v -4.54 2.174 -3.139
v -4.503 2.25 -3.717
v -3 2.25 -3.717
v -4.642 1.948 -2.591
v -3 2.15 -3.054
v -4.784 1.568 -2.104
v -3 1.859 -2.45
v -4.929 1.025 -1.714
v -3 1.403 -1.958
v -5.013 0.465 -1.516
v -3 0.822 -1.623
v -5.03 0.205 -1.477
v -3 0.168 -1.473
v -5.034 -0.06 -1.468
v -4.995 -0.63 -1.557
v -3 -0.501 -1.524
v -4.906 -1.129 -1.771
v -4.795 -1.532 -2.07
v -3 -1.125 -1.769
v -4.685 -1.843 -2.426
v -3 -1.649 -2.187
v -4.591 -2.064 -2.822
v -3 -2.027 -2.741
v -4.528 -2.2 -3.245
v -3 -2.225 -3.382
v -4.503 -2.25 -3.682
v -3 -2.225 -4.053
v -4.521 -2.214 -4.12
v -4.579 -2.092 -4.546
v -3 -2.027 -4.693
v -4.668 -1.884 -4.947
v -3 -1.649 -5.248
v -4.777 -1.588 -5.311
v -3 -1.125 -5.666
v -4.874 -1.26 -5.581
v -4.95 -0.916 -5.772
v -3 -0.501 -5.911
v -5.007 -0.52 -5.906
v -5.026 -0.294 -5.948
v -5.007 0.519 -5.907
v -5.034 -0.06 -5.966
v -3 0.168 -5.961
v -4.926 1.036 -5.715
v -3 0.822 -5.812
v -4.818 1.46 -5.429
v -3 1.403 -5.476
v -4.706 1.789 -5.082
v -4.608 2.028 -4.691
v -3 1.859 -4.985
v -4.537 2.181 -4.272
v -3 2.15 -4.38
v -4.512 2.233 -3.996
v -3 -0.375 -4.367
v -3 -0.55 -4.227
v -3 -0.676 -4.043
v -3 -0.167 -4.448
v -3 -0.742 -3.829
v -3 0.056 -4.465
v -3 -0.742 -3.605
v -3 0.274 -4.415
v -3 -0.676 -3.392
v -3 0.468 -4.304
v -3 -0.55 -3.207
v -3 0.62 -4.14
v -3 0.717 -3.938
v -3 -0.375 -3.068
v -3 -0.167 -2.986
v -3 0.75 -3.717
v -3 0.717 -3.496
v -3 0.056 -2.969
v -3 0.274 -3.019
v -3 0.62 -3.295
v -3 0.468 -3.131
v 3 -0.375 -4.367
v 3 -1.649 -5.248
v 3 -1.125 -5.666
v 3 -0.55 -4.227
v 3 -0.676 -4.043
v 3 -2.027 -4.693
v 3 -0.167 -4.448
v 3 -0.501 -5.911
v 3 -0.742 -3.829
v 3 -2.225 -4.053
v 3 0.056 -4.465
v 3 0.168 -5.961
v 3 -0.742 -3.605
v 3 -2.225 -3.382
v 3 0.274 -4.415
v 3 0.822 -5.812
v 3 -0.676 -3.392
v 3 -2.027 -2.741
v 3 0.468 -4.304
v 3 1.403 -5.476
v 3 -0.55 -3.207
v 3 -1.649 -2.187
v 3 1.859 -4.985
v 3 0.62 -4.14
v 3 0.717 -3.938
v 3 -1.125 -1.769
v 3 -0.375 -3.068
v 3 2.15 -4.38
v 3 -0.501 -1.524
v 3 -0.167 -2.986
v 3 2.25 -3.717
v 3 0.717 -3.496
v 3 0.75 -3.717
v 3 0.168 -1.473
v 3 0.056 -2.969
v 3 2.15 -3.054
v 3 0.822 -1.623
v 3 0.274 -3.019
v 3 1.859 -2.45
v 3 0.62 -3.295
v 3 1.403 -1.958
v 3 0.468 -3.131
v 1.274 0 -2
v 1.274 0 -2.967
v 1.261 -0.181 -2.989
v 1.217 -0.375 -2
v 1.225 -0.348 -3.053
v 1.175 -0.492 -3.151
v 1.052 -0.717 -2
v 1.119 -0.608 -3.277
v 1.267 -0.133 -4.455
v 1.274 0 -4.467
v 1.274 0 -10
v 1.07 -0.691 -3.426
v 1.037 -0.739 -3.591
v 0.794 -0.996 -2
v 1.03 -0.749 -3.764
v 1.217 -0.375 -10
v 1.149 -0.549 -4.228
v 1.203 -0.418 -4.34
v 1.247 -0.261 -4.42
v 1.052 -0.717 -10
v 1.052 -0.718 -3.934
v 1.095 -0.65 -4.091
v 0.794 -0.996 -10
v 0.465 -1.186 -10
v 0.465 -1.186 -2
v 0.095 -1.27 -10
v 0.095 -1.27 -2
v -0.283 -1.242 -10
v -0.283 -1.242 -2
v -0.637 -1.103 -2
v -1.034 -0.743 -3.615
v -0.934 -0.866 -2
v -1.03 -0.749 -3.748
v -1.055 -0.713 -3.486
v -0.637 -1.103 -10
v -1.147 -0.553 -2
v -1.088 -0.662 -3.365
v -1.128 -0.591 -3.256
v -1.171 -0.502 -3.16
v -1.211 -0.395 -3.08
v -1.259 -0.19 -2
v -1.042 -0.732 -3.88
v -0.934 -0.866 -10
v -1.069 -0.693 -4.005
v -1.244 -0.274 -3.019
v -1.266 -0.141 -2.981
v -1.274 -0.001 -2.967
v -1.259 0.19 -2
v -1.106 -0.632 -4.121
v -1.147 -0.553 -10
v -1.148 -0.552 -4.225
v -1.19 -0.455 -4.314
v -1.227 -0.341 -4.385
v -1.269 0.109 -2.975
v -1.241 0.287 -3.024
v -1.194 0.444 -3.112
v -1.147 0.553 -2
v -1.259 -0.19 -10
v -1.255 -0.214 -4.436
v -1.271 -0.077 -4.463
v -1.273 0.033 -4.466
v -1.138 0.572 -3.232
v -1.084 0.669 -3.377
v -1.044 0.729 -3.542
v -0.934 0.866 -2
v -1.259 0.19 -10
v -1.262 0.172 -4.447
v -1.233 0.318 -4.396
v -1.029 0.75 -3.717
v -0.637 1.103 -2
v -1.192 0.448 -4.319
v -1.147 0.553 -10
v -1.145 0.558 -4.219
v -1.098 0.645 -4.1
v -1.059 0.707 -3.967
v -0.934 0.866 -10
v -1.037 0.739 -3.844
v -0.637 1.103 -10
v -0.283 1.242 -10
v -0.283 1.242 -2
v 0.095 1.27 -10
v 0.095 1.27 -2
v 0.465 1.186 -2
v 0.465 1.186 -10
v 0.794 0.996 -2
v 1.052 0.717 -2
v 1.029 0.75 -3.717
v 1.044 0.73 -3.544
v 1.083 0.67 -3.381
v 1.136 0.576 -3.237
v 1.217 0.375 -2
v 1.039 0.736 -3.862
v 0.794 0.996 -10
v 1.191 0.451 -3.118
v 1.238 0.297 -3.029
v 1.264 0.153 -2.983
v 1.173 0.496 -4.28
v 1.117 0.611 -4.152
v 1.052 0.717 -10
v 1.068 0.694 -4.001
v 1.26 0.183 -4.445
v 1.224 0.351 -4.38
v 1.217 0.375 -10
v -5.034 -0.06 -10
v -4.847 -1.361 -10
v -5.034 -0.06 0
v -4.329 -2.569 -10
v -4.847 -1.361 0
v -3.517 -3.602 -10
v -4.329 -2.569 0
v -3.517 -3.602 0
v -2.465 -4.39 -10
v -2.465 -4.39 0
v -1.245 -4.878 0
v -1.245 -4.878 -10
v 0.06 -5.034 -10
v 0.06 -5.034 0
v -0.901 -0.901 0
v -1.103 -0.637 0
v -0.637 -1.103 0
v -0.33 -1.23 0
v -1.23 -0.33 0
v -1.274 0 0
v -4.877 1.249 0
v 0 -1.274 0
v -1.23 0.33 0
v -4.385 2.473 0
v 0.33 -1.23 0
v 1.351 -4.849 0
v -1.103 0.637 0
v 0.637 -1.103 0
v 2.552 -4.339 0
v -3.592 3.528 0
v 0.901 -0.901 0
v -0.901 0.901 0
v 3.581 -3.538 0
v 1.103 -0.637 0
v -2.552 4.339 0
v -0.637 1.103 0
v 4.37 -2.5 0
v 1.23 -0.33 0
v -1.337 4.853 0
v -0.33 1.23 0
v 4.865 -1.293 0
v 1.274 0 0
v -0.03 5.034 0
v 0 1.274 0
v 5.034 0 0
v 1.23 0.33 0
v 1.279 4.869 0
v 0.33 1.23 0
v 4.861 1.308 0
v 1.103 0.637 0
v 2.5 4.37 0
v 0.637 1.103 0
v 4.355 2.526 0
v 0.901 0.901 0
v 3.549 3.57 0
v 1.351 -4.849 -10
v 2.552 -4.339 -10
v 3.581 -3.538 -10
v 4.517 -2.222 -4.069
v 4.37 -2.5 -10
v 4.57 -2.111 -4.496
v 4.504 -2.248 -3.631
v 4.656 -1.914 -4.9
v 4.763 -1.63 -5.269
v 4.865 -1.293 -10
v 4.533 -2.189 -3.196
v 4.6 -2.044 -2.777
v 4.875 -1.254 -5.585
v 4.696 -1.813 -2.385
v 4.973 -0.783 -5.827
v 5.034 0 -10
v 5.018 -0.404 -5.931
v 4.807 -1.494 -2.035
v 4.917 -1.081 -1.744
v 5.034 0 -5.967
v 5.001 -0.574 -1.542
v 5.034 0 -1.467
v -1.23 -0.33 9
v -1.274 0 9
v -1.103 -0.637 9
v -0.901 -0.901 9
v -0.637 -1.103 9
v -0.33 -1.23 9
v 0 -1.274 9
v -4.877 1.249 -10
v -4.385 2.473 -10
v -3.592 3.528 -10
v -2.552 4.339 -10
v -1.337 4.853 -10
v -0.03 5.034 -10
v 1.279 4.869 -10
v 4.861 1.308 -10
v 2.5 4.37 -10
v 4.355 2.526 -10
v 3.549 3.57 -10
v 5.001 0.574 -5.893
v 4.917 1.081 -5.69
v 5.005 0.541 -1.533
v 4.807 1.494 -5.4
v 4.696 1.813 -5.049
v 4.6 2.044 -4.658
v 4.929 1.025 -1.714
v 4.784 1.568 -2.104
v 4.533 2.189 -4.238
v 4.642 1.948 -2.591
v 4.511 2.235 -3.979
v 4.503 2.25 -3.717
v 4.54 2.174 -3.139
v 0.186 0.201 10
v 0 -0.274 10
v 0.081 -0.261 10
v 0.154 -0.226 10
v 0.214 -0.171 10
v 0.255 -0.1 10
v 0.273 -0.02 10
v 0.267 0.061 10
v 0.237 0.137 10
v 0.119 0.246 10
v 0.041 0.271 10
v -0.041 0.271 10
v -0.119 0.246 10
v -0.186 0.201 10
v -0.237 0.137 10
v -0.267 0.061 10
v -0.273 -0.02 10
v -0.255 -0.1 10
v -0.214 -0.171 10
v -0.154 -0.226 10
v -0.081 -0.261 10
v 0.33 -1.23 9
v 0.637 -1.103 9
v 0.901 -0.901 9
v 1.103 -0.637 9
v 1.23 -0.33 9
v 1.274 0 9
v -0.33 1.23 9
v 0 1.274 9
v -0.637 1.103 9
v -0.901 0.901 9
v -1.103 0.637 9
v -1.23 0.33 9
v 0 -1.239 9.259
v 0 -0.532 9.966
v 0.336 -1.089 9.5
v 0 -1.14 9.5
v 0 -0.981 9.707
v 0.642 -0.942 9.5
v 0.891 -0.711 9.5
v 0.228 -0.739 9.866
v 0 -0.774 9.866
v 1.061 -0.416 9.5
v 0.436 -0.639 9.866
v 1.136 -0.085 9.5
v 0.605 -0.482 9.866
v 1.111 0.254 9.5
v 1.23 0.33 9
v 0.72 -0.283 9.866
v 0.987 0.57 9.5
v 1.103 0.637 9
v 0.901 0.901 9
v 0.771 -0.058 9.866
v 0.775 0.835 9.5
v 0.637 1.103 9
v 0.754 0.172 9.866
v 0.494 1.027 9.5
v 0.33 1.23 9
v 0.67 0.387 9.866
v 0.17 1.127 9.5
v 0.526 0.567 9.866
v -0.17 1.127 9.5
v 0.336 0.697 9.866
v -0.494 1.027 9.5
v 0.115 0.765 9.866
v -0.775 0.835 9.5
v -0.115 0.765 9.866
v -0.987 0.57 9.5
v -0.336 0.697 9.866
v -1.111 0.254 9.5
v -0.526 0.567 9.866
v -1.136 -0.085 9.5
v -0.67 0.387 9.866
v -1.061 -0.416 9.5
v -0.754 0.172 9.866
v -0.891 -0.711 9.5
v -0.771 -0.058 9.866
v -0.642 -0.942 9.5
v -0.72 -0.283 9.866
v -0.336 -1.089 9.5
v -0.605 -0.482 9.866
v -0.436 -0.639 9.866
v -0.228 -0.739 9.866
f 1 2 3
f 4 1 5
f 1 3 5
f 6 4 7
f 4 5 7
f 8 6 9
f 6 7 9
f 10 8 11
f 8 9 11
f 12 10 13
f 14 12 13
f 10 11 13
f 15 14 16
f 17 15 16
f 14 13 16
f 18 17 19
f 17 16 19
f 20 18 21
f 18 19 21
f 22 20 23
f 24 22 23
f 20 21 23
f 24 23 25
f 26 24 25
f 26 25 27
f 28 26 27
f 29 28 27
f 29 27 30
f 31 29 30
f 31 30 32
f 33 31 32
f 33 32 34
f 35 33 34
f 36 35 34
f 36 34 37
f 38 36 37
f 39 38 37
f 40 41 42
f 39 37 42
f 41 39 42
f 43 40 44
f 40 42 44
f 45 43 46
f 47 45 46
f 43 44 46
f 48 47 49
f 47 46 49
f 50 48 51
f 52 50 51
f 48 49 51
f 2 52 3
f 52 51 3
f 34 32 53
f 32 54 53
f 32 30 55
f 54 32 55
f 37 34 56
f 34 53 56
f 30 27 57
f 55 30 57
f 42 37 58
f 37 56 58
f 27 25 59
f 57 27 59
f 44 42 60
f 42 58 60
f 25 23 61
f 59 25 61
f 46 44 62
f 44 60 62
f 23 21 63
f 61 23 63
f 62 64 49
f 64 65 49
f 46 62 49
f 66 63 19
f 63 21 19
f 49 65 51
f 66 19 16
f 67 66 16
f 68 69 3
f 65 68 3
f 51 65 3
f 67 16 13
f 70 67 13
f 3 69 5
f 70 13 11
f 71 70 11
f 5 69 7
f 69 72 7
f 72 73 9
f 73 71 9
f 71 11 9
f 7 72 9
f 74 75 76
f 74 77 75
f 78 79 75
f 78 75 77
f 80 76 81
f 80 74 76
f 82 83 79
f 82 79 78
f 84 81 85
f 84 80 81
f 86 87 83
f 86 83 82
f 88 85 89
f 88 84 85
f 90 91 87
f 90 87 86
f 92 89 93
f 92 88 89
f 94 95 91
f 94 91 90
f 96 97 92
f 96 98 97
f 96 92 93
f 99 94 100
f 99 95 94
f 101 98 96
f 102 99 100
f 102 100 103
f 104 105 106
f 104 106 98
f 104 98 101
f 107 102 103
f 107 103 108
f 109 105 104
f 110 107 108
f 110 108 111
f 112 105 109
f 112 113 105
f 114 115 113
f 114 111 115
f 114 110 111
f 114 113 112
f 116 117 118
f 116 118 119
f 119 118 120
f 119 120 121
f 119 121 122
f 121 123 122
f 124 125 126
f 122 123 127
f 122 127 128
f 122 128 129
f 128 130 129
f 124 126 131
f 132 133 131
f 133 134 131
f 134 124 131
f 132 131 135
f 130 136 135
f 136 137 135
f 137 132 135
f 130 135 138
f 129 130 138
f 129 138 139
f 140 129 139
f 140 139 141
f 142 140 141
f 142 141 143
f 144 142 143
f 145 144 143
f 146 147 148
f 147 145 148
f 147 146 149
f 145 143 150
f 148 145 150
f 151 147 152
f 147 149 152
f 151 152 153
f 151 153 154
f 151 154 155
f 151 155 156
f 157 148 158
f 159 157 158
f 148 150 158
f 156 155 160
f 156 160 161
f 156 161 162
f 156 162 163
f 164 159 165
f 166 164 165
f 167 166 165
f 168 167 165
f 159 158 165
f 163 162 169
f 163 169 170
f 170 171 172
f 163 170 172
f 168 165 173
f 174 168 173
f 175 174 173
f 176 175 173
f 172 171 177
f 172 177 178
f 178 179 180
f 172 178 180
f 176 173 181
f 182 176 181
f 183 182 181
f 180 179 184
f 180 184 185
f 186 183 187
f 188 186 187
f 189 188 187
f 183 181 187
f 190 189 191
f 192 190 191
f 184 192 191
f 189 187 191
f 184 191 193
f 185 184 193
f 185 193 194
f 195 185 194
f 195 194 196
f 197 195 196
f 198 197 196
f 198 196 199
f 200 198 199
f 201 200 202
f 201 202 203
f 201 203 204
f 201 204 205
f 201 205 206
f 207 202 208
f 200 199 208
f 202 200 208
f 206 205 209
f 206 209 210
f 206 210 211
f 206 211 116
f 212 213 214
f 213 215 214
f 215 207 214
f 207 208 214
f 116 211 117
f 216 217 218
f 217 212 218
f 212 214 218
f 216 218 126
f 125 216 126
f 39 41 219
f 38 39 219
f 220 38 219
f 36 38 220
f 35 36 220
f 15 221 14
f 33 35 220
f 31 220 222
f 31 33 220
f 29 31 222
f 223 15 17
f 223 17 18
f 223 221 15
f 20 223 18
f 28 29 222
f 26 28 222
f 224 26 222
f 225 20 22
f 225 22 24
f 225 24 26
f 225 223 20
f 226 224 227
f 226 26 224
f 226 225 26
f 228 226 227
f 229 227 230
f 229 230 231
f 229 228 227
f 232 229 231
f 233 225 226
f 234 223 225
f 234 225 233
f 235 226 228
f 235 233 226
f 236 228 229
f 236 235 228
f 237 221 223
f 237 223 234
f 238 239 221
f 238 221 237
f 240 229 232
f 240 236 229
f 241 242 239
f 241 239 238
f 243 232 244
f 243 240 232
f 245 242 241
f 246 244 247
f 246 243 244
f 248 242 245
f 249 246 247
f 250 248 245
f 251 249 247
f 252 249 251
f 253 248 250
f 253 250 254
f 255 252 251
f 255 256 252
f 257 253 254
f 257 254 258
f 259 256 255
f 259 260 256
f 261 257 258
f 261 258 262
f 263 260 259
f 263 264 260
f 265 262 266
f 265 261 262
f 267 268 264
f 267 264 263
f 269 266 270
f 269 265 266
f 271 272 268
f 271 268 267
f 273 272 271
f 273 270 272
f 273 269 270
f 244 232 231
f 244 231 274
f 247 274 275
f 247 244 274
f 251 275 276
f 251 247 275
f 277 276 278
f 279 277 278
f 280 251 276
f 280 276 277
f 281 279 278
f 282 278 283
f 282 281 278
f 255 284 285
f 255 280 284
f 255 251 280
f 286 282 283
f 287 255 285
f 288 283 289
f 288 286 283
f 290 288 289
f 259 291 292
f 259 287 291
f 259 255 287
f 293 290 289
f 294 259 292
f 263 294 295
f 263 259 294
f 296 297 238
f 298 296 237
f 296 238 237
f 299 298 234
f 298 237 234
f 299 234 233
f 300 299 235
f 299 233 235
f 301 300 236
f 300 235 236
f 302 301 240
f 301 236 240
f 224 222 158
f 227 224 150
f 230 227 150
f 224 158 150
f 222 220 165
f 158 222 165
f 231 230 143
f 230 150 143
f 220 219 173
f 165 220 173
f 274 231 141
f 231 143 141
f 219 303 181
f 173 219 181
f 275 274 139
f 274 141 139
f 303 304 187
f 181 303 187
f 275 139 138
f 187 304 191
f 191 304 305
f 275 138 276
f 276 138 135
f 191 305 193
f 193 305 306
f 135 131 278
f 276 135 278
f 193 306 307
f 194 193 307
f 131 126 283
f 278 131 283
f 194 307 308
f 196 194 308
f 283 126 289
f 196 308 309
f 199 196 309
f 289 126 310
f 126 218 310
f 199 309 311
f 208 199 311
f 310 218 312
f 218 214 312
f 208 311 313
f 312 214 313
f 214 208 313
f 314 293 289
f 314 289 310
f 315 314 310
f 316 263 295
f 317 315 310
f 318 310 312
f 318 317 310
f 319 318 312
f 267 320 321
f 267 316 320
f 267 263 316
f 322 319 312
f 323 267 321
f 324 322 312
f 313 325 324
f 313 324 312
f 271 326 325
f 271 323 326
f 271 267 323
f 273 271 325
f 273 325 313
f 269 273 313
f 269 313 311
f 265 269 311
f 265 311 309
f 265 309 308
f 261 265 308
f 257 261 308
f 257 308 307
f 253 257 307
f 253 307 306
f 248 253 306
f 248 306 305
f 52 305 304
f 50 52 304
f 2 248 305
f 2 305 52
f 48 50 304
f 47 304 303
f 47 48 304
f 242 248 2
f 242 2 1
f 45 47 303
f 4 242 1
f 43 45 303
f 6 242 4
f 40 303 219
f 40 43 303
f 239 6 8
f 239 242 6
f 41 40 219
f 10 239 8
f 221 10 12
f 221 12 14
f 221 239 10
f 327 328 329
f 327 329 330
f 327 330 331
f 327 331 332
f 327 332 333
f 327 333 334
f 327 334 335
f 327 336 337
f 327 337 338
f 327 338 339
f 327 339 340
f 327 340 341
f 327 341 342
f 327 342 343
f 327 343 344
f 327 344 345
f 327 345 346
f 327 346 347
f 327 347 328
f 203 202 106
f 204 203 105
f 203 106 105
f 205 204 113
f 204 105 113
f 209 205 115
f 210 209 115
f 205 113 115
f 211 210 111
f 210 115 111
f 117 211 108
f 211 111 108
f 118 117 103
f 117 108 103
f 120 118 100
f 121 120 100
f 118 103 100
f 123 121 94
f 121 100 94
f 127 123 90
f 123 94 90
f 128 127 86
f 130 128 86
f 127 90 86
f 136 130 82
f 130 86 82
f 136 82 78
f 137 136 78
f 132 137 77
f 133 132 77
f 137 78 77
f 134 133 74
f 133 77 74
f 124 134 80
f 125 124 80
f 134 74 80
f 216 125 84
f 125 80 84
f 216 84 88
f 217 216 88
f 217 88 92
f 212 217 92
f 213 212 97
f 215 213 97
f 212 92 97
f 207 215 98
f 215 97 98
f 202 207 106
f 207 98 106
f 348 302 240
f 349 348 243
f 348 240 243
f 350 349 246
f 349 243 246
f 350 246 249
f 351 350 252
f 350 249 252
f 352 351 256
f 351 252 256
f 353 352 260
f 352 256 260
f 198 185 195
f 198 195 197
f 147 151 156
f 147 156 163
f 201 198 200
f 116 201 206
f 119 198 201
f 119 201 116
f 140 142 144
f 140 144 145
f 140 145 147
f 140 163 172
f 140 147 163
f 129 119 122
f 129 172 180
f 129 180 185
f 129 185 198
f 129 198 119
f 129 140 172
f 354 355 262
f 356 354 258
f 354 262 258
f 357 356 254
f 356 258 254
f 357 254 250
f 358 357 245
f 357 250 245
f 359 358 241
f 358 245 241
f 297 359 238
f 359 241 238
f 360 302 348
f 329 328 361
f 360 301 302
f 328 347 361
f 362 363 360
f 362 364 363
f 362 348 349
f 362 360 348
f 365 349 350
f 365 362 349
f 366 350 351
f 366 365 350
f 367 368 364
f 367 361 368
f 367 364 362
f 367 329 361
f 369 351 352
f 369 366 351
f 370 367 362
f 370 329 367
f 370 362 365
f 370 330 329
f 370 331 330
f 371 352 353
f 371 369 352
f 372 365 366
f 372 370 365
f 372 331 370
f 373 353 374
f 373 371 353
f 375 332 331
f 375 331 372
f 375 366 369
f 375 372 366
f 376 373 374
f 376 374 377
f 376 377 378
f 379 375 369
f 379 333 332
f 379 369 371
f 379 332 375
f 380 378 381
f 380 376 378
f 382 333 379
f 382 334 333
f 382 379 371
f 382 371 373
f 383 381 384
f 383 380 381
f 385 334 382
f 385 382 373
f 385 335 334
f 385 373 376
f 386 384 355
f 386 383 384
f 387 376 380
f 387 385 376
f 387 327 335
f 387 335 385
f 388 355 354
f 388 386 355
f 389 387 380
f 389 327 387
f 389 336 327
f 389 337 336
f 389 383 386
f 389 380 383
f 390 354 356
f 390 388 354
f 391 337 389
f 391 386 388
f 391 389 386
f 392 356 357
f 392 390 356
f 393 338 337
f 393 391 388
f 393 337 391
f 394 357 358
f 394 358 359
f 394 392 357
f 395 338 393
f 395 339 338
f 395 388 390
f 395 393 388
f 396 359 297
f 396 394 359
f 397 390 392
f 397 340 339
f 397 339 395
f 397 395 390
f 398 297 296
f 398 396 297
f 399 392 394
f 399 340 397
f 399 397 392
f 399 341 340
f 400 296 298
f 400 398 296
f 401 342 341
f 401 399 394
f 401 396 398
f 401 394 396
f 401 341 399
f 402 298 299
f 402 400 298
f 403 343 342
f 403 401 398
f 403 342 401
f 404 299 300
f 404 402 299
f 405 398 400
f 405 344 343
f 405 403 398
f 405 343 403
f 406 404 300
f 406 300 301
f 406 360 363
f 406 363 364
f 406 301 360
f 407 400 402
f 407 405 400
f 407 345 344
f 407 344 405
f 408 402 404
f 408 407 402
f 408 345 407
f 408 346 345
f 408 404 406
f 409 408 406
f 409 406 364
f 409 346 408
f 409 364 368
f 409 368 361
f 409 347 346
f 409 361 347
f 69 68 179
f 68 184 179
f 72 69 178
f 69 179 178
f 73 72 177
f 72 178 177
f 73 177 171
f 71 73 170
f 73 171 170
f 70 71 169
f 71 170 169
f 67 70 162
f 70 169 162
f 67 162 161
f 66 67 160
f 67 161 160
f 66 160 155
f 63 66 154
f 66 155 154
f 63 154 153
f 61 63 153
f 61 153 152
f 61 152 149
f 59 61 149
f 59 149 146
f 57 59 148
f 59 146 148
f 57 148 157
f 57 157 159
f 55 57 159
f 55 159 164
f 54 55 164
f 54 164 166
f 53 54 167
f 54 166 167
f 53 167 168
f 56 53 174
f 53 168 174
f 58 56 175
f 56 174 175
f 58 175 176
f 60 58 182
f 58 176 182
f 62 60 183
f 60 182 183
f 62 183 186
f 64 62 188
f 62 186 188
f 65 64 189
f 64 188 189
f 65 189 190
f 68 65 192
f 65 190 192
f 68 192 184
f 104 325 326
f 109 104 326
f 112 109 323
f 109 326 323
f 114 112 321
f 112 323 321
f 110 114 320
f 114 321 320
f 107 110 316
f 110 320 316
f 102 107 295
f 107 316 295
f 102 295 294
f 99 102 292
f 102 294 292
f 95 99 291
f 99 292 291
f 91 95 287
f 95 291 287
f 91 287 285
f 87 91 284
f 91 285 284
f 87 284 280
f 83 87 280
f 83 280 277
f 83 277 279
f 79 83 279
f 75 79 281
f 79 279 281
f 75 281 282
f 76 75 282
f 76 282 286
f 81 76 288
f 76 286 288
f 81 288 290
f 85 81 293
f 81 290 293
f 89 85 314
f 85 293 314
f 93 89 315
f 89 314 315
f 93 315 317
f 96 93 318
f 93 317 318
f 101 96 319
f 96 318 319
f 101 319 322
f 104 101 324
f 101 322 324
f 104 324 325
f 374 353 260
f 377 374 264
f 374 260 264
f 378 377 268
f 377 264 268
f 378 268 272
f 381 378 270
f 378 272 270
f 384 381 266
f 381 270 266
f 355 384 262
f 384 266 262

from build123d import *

# Parameters (mm, degrees)
F1_DEPTH  = 10
F2_DEPTH  = 10
F4_R      = 1.2735627731
F5_DEPTH  = 8
F6_R      = 0.75
F7_DEPTH  = 12.5
F9_R      = 2.25
F9_R_2    = 0.75
F10_DEPTH = 2
F12_R     = 2.25
F12_R_2   = 0.75
F13_DEPTH = 2


# Not quite as in the source:
# - a fillet or chamfer that OpenCascade refuses, or shapes differently, is made with other operations: its cross-section is extruded or revolved along the edge and cut away or added
# - a feature names something its author has since deleted; it is built from what else it names


with BuildPart() as f1:
    # F0 (on Top) → F1 (new body)
    with BuildSketch(Plane.XY):
        with BuildLine():
            Line((0, 0), (1.2735627731, 0))
            ThreePointArc((1.2735627731, 0), (0.9005448731, 0.9005448731), (0, 1.2735627731))
            Line((0, 1.2735627731), (0, 0))
        make_face()
        with BuildLine():
            Line((0, 0), (0, 1.2735627731))
            ThreePointArc((0, 1.2735627731), (-0.9005448731, 0.9005448731), (-1.2735627731, 0))
            Line((-1.2735627731, 0), (0, 0))
        make_face()
        with BuildLine():
            ThreePointArc((-1.2735627731, 0), (-0.9005448731, -0.9005448731), (0, -1.2735627731))
            Line((0, -1.2735627731), (0, 0))
            Line((0, 0), (-1.2735627731, 0))
        make_face()
        with BuildLine():
            ThreePointArc((0, -1.2735627731), (0.9005448731, -0.9005448731), (1.2735627731, 0))
            Line((1.2735627731, 0), (0, 0))
            Line((0, 0), (0, -1.2735627731))
        make_face()
    extrude(amount=F1_DEPTH)

    # F0 (on Top) → F2 (join)
    with BuildSketch(Plane.XY):
        with BuildLine():
            ThreePointArc((0.0602184818, -5.0337774218), (3.5808999931, -3.5383183346), (5.0341376022, 0))
            ThreePointArc((5.0341376022, 0), (-0.0301919188, 5.0340470643), (-5.033775454, -0.0603827516))
            ThreePointArc((-5.033775454, -0.0603827516), (-3.5167784797, -3.6020564297), (0.0602184818, -5.0337774218))
        make_face()
        with BuildLine():
            ThreePointArc((0, 1.2735627731), (0.9005448731, 0.9005448731), (1.2735627731, 0))
            ThreePointArc((1.2735627731, 0), (0.9005448731, -0.9005448731), (0, -1.2735627731))
            ThreePointArc((0, -1.2735627731), (-0.9005448731, -0.9005448731), (-1.2735627731, 0))
            ThreePointArc((-1.2735627731, 0), (-0.9005448731, 0.9005448731), (0, 1.2735627731))
        make_face(mode=Mode.SUBTRACT)
        with BuildLine():
            Line((0, 0), (1.2735627731, 0))
            ThreePointArc((1.2735627731, 0), (0.9005448731, 0.9005448731), (0, 1.2735627731))
            Line((0, 1.2735627731), (0, 0))
        make_face()
        with BuildLine():
            Line((0, 0), (0, 1.2735627731))
            ThreePointArc((0, 1.2735627731), (-0.9005448731, 0.9005448731), (-1.2735627731, 0))
            Line((-1.2735627731, 0), (0, 0))
        make_face()
        with BuildLine():
            ThreePointArc((-1.2735627731, 0), (-0.9005448731, -0.9005448731), (0, -1.2735627731))
            Line((0, -1.2735627731), (0, 0))
            Line((0, 0), (-1.2735627731, 0))
        make_face()
        with BuildLine():
            ThreePointArc((0, -1.2735627731), (0.9005448731, -0.9005448731), (1.2735627731, 0))
            Line((1.2735627731, 0), (0, 0))
            Line((0, 0), (0, -1.2735627731))
        make_face()
    extrude(amount=-F2_DEPTH)

    # F3: fillet of radius 1 on 1 edges, made by hand

    # F3_s1 → F3_t2 (revolve, cut)
    with BuildSketch(Plane.YZ):
        with BuildLine():
            ThreePointArc((-1.2735627731, 9), (-0.9806695543, 9.7071067812), (-0.2735627731, 10))
            Line((-0.2735627731, 10), (-1.2735627731, 10))
            Line((-1.2735627731, 10), (-1.2735627731, 9))
        make_face()
    revolve(axis=Axis((0, 0, 10), (0, 0, 1)), mode=Mode.SUBTRACT)

    # F4 (on face) → F5 (cut)
    with BuildSketch(Plane(origin=(0, 0, -10), x_dir=(1, 0, 0), z_dir=(0, 0, -1))):
        Circle(F4_R)
    extrude(amount=-F5_DEPTH, mode=Mode.SUBTRACT)

    # F6 (on Right) → F7 (cut, symmetric)
    with BuildSketch(Plane.YZ):
        with Locations((0, -3.7172080483)):
            Circle(F6_R)
    extrude(amount=F7_DEPTH, both=True, mode=Mode.SUBTRACT)

    # F9 (on offset) → F10 (cut, symmetric)
    with BuildSketch(Plane.YZ.offset(5)):
        with Locations((0, -3.7172080483)):
            Circle(F9_R)
        with Locations((0, -3.7172080483)):
            Circle(F9_R_2, mode=Mode.SUBTRACT)
    extrude(amount=F10_DEPTH, both=True, mode=Mode.SUBTRACT)

    # F12 (on offset) → F13 (cut, symmetric)
    with BuildSketch(Plane.YZ.offset(-5)):
        with Locations((0, -3.7172080483)):
            Circle(F12_R)
        with Locations((0, -3.7172080483)):
            Circle(F12_R_2, mode=Mode.SUBTRACT)
    extrude(amount=F13_DEPTH, both=True, mode=Mode.SUBTRACT)


solid = f1.part
